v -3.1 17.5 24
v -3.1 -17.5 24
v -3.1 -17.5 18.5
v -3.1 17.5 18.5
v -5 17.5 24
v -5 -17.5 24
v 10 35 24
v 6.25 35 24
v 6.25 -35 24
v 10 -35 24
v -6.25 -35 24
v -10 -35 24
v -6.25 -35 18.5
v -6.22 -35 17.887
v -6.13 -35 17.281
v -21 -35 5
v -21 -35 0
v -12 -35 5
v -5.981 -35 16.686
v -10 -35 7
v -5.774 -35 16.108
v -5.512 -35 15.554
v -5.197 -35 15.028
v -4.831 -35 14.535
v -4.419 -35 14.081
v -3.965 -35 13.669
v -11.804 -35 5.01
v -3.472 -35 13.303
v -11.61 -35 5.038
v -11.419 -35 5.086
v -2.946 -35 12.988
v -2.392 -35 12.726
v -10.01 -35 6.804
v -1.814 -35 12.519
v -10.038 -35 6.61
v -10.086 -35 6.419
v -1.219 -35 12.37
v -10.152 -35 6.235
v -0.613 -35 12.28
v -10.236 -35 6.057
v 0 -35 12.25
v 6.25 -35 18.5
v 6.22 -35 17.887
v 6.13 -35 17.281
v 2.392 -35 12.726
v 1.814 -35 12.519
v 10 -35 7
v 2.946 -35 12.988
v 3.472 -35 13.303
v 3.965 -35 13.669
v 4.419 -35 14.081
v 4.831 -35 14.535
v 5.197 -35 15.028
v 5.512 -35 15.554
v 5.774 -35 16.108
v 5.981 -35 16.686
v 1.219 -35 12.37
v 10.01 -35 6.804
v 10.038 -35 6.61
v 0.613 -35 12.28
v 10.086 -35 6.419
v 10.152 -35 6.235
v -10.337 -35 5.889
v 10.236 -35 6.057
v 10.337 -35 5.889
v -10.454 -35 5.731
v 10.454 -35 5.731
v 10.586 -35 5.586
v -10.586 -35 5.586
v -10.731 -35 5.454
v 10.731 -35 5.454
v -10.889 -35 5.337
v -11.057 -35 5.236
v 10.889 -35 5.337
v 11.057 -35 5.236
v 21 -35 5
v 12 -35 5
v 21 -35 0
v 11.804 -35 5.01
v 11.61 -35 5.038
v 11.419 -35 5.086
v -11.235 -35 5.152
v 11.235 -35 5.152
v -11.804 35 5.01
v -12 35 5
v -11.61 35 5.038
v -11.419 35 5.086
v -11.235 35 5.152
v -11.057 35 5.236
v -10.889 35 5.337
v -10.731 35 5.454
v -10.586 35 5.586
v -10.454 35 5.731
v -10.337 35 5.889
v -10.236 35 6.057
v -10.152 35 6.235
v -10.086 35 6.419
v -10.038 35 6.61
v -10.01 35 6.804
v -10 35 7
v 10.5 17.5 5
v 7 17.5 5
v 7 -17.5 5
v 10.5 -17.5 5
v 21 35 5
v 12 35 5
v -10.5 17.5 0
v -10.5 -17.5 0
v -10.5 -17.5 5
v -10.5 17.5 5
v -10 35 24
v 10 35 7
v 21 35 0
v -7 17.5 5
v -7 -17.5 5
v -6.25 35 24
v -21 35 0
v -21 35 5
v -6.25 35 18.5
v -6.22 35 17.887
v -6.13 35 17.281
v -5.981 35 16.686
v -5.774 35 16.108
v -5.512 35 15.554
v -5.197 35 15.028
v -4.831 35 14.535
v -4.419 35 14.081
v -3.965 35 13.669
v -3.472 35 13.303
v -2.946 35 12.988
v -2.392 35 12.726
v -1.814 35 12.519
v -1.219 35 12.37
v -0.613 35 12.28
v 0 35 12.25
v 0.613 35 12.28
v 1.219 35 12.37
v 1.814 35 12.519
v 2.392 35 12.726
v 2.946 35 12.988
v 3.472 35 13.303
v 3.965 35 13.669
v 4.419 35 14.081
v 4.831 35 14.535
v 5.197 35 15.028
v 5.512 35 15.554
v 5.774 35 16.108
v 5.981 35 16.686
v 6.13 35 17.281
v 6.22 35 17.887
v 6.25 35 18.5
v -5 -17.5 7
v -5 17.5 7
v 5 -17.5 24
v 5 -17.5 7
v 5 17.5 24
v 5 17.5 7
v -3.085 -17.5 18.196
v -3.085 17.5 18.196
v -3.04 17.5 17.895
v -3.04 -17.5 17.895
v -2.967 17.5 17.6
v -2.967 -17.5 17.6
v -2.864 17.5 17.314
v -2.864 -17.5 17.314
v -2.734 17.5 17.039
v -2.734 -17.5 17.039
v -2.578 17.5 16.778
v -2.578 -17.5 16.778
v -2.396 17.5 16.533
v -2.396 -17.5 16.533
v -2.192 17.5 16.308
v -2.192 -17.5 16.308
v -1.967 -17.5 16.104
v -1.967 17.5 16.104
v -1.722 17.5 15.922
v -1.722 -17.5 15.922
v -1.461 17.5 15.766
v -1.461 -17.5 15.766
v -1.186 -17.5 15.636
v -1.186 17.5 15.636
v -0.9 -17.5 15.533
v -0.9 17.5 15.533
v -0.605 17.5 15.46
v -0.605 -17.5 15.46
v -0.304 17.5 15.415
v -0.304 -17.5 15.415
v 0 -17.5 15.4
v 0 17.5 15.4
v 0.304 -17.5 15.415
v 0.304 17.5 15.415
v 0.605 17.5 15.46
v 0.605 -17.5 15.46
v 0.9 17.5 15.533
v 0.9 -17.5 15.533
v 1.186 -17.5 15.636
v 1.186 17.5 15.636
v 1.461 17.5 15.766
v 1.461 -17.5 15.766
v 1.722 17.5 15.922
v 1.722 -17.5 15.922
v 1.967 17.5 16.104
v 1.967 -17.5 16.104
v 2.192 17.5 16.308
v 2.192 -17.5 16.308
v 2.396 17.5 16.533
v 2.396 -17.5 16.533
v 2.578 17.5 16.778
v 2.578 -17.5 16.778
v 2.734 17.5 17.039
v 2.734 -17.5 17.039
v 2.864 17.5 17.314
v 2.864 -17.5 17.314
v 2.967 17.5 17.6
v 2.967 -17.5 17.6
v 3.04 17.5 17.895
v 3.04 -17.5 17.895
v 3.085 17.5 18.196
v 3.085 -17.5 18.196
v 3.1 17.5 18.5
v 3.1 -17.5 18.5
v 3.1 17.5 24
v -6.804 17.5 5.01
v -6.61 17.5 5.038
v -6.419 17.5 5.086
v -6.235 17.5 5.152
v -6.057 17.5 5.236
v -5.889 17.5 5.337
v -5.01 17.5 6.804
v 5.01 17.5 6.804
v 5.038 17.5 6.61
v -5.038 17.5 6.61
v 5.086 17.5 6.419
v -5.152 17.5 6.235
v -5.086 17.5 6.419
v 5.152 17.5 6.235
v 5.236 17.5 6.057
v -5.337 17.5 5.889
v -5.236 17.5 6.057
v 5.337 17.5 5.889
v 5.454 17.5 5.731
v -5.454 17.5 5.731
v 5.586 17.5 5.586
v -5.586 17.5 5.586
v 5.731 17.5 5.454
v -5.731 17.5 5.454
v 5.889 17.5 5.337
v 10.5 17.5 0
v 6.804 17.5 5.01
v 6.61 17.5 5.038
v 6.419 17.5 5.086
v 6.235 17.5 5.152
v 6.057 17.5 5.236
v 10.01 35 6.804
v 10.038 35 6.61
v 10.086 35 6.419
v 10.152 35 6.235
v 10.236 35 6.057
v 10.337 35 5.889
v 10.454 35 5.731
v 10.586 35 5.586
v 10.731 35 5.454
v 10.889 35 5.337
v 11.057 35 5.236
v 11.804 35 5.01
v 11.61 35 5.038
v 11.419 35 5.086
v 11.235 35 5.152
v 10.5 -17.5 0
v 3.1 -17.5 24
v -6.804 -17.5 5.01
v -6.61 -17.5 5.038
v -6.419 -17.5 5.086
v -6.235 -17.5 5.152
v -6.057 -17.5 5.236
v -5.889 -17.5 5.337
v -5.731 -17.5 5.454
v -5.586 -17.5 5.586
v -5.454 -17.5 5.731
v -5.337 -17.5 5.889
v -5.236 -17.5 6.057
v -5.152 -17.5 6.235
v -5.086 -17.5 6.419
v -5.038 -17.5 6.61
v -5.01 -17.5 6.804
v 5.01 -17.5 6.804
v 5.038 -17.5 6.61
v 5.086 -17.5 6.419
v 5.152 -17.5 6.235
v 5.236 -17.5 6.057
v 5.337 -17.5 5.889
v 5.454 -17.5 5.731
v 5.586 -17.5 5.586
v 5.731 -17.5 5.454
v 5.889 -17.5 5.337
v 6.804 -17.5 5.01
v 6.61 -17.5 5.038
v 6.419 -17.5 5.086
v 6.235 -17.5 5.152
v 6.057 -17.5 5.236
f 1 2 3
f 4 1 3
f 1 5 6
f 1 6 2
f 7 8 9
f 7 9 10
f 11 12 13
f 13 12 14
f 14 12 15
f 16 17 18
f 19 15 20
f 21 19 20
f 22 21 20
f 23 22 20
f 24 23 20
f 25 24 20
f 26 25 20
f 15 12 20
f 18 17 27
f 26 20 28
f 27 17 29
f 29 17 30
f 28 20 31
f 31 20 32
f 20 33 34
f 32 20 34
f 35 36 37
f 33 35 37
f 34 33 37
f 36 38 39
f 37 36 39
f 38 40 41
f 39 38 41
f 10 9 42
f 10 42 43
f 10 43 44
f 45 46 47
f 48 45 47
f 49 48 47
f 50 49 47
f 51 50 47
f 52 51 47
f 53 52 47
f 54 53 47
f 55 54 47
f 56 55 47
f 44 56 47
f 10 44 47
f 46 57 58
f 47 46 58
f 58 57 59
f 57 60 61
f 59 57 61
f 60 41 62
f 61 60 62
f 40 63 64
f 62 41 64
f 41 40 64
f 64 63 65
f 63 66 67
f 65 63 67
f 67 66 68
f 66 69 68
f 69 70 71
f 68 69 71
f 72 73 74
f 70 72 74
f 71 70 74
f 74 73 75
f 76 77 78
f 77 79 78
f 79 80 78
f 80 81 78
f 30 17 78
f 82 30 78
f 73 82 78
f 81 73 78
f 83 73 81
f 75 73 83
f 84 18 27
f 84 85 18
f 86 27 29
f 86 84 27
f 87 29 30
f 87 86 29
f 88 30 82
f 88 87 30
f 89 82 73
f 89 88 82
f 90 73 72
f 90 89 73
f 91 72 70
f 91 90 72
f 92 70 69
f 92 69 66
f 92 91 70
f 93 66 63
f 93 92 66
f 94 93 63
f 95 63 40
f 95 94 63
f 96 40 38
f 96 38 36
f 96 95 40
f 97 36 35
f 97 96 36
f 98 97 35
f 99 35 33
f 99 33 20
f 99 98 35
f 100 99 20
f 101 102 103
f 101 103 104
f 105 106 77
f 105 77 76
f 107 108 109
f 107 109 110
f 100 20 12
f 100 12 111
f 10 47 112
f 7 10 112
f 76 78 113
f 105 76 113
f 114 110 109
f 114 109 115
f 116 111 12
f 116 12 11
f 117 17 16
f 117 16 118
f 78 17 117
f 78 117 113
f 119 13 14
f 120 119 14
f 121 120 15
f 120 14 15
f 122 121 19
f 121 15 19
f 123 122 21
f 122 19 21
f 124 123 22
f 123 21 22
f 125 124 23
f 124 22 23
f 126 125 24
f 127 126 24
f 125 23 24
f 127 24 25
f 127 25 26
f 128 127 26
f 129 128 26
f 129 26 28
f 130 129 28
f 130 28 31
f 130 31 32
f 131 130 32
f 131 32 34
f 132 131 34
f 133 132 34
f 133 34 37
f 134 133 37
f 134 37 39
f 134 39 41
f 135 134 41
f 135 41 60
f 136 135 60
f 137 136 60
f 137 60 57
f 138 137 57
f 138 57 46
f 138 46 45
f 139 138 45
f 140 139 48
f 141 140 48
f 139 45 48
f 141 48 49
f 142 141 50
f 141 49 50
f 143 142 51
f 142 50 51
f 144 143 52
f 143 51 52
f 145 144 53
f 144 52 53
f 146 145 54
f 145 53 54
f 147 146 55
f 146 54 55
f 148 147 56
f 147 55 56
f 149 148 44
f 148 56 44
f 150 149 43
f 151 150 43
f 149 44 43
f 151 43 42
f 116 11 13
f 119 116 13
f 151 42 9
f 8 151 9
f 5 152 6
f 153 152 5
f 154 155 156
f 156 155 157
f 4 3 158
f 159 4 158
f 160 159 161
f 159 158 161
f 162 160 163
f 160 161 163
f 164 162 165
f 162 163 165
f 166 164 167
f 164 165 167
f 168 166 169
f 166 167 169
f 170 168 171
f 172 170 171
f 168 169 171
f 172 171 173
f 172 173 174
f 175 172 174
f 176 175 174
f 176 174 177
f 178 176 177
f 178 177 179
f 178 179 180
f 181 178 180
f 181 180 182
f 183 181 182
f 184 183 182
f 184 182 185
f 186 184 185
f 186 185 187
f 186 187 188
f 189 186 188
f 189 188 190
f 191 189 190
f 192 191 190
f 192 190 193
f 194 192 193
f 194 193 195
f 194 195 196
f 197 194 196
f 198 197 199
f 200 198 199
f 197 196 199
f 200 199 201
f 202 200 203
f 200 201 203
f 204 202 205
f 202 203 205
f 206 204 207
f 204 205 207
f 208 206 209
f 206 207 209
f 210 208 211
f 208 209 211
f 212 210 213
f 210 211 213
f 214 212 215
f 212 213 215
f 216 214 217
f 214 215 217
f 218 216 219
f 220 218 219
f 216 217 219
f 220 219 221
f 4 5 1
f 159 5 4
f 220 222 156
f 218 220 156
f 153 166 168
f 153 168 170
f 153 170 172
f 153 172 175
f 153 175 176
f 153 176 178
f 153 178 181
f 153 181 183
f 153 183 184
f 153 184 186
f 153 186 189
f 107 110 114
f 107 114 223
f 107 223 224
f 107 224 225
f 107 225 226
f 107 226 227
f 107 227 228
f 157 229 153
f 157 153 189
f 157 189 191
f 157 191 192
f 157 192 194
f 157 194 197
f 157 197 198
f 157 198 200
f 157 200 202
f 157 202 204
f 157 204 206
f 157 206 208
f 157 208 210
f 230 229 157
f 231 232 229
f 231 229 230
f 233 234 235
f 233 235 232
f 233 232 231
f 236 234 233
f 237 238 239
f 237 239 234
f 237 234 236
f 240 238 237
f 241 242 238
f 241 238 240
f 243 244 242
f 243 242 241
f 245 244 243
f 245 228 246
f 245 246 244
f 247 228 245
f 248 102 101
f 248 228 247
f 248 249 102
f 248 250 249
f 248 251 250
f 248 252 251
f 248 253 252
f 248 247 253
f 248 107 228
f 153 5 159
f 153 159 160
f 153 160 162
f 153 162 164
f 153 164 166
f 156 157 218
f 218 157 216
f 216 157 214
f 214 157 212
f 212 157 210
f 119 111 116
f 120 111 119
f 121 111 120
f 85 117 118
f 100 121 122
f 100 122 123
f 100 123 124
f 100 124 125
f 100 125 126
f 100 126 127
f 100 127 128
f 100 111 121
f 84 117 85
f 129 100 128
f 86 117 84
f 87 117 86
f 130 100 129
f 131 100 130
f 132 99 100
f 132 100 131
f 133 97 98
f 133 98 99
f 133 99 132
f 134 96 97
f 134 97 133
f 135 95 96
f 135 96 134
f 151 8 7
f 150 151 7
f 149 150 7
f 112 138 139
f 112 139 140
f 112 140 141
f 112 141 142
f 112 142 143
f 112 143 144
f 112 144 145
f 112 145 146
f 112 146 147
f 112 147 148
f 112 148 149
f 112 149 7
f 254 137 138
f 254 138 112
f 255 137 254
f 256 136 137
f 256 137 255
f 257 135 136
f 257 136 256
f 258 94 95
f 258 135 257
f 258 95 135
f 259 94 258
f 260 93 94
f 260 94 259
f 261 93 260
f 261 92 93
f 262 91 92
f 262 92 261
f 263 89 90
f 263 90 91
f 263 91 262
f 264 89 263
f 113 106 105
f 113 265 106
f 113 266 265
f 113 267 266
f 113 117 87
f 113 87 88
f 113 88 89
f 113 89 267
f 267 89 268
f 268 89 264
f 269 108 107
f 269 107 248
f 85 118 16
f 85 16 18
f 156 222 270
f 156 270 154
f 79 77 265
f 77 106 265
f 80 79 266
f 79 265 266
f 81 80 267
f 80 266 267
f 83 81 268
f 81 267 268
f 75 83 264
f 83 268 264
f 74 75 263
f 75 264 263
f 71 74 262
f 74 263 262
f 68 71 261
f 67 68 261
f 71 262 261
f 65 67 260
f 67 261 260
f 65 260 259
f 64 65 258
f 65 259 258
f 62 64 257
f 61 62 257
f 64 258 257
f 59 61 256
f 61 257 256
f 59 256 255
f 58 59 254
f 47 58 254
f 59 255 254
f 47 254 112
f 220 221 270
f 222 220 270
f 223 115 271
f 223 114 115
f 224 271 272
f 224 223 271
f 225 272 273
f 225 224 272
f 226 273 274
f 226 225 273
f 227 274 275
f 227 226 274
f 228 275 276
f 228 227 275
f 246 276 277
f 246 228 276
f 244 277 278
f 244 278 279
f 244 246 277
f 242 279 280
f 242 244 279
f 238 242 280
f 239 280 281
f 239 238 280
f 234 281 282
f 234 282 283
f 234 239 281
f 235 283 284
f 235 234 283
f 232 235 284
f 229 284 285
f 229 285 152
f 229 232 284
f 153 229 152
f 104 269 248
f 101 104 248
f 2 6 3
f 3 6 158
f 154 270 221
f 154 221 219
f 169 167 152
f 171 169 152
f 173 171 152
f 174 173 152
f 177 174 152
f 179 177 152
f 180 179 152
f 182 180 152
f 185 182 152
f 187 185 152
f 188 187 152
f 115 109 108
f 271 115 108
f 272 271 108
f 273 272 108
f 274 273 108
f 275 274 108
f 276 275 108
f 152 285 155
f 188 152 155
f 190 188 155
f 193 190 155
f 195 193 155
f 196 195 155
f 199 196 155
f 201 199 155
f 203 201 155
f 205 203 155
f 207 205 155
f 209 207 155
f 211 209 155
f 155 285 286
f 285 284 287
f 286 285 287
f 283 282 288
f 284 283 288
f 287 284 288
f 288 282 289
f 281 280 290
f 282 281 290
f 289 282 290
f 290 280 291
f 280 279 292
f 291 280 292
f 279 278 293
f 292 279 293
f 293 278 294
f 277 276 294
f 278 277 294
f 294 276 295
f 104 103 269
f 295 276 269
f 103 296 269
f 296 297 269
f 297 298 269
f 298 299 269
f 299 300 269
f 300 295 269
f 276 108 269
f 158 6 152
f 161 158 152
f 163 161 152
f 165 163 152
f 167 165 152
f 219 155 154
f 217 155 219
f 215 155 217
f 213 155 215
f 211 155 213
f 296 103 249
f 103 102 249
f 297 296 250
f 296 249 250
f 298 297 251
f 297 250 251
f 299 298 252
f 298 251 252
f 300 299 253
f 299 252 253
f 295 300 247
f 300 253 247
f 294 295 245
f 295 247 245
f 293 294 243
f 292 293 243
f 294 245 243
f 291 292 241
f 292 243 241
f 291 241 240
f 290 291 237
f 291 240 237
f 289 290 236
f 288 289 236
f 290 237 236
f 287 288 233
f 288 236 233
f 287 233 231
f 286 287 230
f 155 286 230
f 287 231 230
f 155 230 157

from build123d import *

# Parameters (mm, degrees)
SKETCH_W        = 42
SKETCH_H        = 70
PAD_DEPTH       = 5
SKETCH001_W     = 20
SKETCH001_H     = 70
PAD001_DEPTH    = 19
POCKET_DEPTH    = 70.001
FILLET_R        = 2
SKETCH003_W     = 21
SKETCH003_H     = 35
PAD002_DEPTH    = 5
SKETCH004_W     = 10
SKETCH004_H     = 35
PAD003_DEPTH    = 19
POCKET001_DEPTH = 35.001
FILLET001_R     = 2


with BuildPart() as body:
    # Sketch (on XY_Plane of Origin) → Pad (new body)
    with BuildSketch(Plane.XY):
        Rectangle(SKETCH_W, SKETCH_H)
    extrude(amount=PAD_DEPTH)

    # Sketch001 (on Face6 of Pad) → Pad001 (join)
    with BuildSketch(Plane.XY.offset(5)):
        Rectangle(SKETCH001_W, SKETCH001_H)
    extrude(amount=PAD001_DEPTH)

    # Sketch002 (on Face9 of Pad001) → Pocket (cut, through all)
    with BuildSketch(Plane.XZ.offset(35)):
        with BuildLine():
            ThreePointArc((-6.25, 18.5), (0, 12.25), (6.25, 18.5))
            Line((6.25, 18.5), (6.25, 24))
            Line((6.25, 24), (-6.25, 24))
            Line((-6.25, 24), (-6.25, 18.5))
        make_face()
    extrude(amount=-POCKET_DEPTH, mode=Mode.SUBTRACT)

    # Fillet
    fillet_edges = [body.edges().sort_by_distance(p)[0] for p in [
        (10, 0, 5),
        (-10, 0, 5),
    ]]
    fillet(fillet_edges, radius=FILLET_R)


with BuildPart() as body001:
    # Sketch003 (on XY_Plane of Origin002) → Pad002 (new body)
    with BuildSketch(Plane.XY):
        Rectangle(SKETCH003_W, SKETCH003_H)
    extrude(amount=PAD002_DEPTH)

    # Sketch004 (on Face6 of Pad002) → Pad003 (join)
    with BuildSketch(Plane.XY.offset(5)):
        Rectangle(SKETCH004_W, SKETCH004_H)
    extrude(amount=PAD003_DEPTH)

    # Sketch005 (on Face9 of Pad003) → Pocket001 (cut, through all)
    with BuildSketch(Plane.XZ.offset(17.5)):
        with BuildLine():
            ThreePointArc((-3.1, 18.5), (0, 15.4), (3.1, 18.5))
            Line((3.1, 18.5), (3.1, 24))
            Line((3.1, 24), (-3.1, 24))
            Line((-3.1, 24), (-3.1, 18.5))
        make_face()
    extrude(amount=-POCKET001_DEPTH, mode=Mode.SUBTRACT)

    # Fillet001
    fillet001_edges = [body001.edges().sort_by_distance(p)[0] for p in [
        (5, 0, 5),
        (-5, 0, 5),
    ]]
    fillet(fillet001_edges, radius=FILLET001_R)


solid = Compound([body.part, body001.part])
